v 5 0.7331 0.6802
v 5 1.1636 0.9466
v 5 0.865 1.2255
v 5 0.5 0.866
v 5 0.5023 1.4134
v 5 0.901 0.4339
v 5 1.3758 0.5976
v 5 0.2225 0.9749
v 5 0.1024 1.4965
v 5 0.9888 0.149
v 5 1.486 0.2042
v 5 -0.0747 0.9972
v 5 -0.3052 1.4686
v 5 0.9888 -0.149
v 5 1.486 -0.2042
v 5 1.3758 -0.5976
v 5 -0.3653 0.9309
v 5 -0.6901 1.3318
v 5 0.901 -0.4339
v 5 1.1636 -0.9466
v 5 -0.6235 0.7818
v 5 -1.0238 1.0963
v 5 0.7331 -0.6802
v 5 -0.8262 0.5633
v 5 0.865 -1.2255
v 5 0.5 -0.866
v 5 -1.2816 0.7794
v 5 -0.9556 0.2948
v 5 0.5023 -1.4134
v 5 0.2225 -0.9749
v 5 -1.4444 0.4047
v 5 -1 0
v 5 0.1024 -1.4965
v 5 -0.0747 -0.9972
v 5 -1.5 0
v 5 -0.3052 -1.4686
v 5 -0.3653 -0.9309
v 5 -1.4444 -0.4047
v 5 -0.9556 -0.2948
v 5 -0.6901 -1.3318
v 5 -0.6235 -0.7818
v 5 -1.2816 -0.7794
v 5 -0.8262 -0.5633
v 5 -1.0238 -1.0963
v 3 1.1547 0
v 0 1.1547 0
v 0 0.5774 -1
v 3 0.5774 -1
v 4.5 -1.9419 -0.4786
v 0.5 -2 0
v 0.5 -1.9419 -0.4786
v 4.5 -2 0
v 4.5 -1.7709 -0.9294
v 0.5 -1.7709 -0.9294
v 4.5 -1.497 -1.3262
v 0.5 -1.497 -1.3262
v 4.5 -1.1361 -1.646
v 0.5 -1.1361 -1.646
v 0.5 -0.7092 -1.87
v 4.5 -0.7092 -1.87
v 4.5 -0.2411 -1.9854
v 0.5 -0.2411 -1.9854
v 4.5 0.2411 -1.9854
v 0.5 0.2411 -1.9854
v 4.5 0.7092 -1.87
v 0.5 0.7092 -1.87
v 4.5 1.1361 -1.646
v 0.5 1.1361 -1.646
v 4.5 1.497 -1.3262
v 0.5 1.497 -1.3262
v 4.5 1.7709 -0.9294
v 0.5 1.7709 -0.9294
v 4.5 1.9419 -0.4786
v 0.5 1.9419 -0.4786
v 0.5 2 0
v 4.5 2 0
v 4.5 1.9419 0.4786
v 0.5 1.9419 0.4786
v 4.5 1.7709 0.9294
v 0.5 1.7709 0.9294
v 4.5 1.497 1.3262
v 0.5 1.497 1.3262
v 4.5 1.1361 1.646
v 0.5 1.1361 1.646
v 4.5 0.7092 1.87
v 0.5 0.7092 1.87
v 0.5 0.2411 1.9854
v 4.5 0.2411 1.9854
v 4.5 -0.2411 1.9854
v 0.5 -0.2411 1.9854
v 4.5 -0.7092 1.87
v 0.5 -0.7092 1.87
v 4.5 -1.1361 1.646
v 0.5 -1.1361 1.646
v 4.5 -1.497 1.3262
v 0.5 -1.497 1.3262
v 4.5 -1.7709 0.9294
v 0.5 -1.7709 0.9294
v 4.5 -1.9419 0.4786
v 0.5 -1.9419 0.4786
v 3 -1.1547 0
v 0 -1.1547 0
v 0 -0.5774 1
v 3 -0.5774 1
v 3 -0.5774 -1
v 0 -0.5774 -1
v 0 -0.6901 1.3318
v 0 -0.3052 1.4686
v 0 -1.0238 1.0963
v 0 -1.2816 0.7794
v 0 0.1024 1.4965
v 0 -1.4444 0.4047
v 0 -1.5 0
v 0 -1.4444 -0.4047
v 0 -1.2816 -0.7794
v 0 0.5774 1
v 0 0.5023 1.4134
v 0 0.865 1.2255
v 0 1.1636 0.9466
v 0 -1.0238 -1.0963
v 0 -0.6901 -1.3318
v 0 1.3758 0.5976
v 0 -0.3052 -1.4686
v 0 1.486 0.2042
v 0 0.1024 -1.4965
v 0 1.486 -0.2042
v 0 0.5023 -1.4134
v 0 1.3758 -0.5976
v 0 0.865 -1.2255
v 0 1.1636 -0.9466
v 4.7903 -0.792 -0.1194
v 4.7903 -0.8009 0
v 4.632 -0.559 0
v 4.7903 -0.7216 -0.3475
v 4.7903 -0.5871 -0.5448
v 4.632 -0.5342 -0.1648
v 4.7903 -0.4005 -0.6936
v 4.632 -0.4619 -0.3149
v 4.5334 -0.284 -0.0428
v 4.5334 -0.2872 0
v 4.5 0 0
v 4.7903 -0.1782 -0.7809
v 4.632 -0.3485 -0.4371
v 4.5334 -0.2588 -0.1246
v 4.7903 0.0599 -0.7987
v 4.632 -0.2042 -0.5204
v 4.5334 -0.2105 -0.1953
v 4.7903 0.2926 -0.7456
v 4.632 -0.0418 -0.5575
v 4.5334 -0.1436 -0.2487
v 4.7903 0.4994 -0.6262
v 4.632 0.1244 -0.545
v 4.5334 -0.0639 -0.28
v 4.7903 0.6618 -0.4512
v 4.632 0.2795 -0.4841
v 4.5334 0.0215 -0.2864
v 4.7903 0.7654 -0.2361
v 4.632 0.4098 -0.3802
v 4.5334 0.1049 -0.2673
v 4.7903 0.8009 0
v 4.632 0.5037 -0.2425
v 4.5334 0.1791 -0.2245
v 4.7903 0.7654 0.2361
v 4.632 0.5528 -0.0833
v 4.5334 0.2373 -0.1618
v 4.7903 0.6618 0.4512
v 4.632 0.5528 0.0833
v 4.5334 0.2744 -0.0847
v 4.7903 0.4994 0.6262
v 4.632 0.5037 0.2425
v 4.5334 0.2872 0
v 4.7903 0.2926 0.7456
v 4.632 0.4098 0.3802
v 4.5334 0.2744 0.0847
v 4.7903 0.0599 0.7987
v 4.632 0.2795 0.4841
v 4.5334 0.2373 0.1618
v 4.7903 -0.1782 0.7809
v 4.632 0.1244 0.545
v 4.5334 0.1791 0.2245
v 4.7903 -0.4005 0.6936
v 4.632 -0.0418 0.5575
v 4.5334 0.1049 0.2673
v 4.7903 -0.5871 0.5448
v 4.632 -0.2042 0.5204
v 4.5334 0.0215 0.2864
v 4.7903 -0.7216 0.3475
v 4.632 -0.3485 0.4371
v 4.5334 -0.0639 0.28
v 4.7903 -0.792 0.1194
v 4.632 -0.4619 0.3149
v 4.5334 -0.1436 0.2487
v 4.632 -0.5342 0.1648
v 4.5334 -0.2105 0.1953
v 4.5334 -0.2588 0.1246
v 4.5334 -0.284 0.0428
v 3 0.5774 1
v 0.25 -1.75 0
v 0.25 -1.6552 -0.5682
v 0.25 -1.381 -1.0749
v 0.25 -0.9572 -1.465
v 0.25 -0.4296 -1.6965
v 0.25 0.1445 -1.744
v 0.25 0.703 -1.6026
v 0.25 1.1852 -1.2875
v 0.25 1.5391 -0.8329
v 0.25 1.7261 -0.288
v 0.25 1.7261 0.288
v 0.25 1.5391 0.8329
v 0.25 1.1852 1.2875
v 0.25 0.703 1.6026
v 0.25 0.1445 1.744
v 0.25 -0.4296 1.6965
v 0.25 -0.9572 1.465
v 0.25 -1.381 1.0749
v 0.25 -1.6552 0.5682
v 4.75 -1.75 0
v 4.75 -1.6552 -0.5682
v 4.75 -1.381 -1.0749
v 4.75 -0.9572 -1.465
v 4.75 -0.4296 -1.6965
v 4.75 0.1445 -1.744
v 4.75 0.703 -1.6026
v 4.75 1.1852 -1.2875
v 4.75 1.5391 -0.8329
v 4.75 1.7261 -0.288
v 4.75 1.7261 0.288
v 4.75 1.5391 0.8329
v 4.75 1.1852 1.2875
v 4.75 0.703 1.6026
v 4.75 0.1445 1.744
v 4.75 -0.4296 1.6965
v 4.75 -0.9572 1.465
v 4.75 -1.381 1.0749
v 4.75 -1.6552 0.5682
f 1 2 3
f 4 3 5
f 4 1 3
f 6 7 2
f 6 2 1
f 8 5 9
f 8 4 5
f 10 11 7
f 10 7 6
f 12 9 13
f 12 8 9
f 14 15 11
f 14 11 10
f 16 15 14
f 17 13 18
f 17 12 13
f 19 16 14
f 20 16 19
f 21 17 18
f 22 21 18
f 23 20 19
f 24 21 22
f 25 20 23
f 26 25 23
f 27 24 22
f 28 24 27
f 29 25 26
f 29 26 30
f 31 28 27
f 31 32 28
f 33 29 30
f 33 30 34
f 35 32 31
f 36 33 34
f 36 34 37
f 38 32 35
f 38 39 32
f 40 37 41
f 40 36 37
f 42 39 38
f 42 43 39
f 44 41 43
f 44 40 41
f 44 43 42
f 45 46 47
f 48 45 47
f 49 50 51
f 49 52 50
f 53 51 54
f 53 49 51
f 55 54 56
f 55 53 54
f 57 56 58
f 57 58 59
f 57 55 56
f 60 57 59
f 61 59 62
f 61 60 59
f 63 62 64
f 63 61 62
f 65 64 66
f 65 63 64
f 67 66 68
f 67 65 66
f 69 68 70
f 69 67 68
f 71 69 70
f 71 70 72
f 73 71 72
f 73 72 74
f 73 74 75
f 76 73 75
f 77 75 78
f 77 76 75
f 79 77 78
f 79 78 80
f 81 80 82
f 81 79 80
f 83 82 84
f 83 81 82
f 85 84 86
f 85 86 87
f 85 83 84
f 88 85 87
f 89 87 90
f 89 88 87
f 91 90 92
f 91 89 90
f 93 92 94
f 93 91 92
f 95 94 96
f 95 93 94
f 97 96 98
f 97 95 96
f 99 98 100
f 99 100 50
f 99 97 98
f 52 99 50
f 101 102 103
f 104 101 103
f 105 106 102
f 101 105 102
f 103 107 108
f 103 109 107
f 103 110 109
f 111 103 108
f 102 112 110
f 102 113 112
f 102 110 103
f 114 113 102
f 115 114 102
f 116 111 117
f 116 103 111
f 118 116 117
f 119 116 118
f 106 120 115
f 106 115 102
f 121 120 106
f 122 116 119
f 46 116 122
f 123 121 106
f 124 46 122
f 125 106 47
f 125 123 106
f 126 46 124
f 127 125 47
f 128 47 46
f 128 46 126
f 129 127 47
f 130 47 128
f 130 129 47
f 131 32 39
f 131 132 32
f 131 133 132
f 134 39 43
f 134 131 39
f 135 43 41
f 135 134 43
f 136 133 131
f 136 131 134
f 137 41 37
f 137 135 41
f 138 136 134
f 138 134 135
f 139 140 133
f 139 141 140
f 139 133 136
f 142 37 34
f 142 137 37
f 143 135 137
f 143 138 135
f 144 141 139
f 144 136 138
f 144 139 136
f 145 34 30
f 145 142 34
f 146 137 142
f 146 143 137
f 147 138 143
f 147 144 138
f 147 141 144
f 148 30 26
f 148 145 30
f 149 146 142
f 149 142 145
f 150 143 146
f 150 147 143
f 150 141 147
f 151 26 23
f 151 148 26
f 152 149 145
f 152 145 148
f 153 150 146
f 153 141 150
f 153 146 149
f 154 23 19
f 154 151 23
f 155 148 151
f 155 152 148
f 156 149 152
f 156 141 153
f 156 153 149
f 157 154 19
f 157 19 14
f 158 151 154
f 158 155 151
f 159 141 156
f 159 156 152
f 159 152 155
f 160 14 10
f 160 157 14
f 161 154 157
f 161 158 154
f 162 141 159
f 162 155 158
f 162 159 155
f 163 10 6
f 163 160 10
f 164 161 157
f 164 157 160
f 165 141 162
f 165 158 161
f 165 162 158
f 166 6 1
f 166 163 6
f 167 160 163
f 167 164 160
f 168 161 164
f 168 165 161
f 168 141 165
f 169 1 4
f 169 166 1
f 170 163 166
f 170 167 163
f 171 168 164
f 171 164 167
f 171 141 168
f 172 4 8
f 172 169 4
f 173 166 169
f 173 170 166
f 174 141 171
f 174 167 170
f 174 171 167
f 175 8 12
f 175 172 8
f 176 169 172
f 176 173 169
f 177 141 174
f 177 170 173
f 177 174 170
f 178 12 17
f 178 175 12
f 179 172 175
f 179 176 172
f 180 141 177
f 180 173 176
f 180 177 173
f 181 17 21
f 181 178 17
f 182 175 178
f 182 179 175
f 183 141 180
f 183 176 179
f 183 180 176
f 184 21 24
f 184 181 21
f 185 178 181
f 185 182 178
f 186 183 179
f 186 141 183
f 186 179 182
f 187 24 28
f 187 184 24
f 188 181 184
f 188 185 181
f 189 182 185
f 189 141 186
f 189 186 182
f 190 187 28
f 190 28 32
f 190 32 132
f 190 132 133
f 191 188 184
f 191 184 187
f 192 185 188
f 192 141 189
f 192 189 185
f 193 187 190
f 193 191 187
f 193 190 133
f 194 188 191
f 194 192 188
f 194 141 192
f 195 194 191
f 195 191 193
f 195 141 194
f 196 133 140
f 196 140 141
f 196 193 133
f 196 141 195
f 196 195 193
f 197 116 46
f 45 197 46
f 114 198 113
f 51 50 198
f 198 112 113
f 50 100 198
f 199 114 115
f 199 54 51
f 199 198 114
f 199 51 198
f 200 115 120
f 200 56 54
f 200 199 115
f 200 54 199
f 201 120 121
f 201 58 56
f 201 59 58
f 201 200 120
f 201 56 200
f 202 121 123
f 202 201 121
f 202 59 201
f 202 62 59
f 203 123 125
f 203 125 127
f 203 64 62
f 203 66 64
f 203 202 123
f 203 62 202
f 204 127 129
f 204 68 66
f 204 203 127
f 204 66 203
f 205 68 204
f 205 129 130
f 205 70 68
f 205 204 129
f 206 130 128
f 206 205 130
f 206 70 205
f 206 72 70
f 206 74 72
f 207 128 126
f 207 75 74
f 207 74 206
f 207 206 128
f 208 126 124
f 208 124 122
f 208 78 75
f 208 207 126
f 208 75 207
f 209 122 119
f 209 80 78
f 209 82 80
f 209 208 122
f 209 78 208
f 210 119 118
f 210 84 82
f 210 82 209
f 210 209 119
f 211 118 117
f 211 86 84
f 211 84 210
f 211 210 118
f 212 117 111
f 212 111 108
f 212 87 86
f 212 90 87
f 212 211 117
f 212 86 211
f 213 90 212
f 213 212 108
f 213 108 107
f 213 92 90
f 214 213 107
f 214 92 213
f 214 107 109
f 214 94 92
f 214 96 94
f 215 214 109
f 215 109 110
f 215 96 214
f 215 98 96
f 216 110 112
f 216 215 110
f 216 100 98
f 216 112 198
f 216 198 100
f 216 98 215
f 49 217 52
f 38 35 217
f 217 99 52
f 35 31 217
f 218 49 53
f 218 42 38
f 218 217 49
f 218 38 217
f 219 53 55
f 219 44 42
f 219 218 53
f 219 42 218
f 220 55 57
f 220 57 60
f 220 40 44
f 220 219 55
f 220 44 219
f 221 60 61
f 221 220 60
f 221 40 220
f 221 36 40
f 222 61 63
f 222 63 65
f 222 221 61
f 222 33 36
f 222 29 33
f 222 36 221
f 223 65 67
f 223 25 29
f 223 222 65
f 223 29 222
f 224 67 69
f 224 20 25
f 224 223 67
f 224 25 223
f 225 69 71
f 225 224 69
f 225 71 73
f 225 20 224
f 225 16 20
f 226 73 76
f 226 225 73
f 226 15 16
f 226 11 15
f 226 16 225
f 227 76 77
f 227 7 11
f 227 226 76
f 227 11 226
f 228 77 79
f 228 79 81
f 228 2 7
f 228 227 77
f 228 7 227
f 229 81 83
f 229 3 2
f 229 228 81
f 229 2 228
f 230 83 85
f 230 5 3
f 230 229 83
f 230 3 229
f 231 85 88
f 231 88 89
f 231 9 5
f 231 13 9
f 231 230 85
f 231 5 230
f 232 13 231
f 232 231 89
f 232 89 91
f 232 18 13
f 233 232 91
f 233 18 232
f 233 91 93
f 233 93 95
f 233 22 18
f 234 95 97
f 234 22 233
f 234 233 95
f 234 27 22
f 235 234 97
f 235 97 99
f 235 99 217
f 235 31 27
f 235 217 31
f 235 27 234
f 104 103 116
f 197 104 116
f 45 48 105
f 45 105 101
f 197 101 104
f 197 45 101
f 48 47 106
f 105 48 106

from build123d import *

# Parameters (mm, degrees)
CUT_EXTRUDE1_DEPTH = 3


with BuildPart() as part:
    # Sketch1 → Revolve1 (revolve)
    with BuildSketch(Plane.XY, mode=Mode.PRIVATE) as revolve1_sk:
        with BuildLine():
            Line((0, 0), (0, 1.5))
            Line((0, 1.5), (0.5, 2))
            Line((0.5, 2), (4.5, 2))
            Line((4.5, 2), (5, 1.5))
            Line((5, 1.5), (5, 1))
            ThreePointArc((5, 1), (4.631966011, 0.559016994), (4.5, 0))
            Line((4.5, 0), (0, 0))
        make_face()
    revolve(revolve1_sk.sketch.rotate(Axis((0, 0, 0), (1, 0, 0)), 180), axis=Axis((0, 0, 0), (1, 0, 0)))

    # Sketch2 → Cut-Extrude1 (cut)
    with BuildSketch(Plane.ZY):
        Polygon((0, 1.154700538), (-1, 0.577350269), (-1, -0.577350269), (0, -1.154700538), (1, -0.577350269), (1, 0.577350269), align=None)
    extrude(amount=-CUT_EXTRUDE1_DEPTH, mode=Mode.SUBTRACT)


solid = part.part
